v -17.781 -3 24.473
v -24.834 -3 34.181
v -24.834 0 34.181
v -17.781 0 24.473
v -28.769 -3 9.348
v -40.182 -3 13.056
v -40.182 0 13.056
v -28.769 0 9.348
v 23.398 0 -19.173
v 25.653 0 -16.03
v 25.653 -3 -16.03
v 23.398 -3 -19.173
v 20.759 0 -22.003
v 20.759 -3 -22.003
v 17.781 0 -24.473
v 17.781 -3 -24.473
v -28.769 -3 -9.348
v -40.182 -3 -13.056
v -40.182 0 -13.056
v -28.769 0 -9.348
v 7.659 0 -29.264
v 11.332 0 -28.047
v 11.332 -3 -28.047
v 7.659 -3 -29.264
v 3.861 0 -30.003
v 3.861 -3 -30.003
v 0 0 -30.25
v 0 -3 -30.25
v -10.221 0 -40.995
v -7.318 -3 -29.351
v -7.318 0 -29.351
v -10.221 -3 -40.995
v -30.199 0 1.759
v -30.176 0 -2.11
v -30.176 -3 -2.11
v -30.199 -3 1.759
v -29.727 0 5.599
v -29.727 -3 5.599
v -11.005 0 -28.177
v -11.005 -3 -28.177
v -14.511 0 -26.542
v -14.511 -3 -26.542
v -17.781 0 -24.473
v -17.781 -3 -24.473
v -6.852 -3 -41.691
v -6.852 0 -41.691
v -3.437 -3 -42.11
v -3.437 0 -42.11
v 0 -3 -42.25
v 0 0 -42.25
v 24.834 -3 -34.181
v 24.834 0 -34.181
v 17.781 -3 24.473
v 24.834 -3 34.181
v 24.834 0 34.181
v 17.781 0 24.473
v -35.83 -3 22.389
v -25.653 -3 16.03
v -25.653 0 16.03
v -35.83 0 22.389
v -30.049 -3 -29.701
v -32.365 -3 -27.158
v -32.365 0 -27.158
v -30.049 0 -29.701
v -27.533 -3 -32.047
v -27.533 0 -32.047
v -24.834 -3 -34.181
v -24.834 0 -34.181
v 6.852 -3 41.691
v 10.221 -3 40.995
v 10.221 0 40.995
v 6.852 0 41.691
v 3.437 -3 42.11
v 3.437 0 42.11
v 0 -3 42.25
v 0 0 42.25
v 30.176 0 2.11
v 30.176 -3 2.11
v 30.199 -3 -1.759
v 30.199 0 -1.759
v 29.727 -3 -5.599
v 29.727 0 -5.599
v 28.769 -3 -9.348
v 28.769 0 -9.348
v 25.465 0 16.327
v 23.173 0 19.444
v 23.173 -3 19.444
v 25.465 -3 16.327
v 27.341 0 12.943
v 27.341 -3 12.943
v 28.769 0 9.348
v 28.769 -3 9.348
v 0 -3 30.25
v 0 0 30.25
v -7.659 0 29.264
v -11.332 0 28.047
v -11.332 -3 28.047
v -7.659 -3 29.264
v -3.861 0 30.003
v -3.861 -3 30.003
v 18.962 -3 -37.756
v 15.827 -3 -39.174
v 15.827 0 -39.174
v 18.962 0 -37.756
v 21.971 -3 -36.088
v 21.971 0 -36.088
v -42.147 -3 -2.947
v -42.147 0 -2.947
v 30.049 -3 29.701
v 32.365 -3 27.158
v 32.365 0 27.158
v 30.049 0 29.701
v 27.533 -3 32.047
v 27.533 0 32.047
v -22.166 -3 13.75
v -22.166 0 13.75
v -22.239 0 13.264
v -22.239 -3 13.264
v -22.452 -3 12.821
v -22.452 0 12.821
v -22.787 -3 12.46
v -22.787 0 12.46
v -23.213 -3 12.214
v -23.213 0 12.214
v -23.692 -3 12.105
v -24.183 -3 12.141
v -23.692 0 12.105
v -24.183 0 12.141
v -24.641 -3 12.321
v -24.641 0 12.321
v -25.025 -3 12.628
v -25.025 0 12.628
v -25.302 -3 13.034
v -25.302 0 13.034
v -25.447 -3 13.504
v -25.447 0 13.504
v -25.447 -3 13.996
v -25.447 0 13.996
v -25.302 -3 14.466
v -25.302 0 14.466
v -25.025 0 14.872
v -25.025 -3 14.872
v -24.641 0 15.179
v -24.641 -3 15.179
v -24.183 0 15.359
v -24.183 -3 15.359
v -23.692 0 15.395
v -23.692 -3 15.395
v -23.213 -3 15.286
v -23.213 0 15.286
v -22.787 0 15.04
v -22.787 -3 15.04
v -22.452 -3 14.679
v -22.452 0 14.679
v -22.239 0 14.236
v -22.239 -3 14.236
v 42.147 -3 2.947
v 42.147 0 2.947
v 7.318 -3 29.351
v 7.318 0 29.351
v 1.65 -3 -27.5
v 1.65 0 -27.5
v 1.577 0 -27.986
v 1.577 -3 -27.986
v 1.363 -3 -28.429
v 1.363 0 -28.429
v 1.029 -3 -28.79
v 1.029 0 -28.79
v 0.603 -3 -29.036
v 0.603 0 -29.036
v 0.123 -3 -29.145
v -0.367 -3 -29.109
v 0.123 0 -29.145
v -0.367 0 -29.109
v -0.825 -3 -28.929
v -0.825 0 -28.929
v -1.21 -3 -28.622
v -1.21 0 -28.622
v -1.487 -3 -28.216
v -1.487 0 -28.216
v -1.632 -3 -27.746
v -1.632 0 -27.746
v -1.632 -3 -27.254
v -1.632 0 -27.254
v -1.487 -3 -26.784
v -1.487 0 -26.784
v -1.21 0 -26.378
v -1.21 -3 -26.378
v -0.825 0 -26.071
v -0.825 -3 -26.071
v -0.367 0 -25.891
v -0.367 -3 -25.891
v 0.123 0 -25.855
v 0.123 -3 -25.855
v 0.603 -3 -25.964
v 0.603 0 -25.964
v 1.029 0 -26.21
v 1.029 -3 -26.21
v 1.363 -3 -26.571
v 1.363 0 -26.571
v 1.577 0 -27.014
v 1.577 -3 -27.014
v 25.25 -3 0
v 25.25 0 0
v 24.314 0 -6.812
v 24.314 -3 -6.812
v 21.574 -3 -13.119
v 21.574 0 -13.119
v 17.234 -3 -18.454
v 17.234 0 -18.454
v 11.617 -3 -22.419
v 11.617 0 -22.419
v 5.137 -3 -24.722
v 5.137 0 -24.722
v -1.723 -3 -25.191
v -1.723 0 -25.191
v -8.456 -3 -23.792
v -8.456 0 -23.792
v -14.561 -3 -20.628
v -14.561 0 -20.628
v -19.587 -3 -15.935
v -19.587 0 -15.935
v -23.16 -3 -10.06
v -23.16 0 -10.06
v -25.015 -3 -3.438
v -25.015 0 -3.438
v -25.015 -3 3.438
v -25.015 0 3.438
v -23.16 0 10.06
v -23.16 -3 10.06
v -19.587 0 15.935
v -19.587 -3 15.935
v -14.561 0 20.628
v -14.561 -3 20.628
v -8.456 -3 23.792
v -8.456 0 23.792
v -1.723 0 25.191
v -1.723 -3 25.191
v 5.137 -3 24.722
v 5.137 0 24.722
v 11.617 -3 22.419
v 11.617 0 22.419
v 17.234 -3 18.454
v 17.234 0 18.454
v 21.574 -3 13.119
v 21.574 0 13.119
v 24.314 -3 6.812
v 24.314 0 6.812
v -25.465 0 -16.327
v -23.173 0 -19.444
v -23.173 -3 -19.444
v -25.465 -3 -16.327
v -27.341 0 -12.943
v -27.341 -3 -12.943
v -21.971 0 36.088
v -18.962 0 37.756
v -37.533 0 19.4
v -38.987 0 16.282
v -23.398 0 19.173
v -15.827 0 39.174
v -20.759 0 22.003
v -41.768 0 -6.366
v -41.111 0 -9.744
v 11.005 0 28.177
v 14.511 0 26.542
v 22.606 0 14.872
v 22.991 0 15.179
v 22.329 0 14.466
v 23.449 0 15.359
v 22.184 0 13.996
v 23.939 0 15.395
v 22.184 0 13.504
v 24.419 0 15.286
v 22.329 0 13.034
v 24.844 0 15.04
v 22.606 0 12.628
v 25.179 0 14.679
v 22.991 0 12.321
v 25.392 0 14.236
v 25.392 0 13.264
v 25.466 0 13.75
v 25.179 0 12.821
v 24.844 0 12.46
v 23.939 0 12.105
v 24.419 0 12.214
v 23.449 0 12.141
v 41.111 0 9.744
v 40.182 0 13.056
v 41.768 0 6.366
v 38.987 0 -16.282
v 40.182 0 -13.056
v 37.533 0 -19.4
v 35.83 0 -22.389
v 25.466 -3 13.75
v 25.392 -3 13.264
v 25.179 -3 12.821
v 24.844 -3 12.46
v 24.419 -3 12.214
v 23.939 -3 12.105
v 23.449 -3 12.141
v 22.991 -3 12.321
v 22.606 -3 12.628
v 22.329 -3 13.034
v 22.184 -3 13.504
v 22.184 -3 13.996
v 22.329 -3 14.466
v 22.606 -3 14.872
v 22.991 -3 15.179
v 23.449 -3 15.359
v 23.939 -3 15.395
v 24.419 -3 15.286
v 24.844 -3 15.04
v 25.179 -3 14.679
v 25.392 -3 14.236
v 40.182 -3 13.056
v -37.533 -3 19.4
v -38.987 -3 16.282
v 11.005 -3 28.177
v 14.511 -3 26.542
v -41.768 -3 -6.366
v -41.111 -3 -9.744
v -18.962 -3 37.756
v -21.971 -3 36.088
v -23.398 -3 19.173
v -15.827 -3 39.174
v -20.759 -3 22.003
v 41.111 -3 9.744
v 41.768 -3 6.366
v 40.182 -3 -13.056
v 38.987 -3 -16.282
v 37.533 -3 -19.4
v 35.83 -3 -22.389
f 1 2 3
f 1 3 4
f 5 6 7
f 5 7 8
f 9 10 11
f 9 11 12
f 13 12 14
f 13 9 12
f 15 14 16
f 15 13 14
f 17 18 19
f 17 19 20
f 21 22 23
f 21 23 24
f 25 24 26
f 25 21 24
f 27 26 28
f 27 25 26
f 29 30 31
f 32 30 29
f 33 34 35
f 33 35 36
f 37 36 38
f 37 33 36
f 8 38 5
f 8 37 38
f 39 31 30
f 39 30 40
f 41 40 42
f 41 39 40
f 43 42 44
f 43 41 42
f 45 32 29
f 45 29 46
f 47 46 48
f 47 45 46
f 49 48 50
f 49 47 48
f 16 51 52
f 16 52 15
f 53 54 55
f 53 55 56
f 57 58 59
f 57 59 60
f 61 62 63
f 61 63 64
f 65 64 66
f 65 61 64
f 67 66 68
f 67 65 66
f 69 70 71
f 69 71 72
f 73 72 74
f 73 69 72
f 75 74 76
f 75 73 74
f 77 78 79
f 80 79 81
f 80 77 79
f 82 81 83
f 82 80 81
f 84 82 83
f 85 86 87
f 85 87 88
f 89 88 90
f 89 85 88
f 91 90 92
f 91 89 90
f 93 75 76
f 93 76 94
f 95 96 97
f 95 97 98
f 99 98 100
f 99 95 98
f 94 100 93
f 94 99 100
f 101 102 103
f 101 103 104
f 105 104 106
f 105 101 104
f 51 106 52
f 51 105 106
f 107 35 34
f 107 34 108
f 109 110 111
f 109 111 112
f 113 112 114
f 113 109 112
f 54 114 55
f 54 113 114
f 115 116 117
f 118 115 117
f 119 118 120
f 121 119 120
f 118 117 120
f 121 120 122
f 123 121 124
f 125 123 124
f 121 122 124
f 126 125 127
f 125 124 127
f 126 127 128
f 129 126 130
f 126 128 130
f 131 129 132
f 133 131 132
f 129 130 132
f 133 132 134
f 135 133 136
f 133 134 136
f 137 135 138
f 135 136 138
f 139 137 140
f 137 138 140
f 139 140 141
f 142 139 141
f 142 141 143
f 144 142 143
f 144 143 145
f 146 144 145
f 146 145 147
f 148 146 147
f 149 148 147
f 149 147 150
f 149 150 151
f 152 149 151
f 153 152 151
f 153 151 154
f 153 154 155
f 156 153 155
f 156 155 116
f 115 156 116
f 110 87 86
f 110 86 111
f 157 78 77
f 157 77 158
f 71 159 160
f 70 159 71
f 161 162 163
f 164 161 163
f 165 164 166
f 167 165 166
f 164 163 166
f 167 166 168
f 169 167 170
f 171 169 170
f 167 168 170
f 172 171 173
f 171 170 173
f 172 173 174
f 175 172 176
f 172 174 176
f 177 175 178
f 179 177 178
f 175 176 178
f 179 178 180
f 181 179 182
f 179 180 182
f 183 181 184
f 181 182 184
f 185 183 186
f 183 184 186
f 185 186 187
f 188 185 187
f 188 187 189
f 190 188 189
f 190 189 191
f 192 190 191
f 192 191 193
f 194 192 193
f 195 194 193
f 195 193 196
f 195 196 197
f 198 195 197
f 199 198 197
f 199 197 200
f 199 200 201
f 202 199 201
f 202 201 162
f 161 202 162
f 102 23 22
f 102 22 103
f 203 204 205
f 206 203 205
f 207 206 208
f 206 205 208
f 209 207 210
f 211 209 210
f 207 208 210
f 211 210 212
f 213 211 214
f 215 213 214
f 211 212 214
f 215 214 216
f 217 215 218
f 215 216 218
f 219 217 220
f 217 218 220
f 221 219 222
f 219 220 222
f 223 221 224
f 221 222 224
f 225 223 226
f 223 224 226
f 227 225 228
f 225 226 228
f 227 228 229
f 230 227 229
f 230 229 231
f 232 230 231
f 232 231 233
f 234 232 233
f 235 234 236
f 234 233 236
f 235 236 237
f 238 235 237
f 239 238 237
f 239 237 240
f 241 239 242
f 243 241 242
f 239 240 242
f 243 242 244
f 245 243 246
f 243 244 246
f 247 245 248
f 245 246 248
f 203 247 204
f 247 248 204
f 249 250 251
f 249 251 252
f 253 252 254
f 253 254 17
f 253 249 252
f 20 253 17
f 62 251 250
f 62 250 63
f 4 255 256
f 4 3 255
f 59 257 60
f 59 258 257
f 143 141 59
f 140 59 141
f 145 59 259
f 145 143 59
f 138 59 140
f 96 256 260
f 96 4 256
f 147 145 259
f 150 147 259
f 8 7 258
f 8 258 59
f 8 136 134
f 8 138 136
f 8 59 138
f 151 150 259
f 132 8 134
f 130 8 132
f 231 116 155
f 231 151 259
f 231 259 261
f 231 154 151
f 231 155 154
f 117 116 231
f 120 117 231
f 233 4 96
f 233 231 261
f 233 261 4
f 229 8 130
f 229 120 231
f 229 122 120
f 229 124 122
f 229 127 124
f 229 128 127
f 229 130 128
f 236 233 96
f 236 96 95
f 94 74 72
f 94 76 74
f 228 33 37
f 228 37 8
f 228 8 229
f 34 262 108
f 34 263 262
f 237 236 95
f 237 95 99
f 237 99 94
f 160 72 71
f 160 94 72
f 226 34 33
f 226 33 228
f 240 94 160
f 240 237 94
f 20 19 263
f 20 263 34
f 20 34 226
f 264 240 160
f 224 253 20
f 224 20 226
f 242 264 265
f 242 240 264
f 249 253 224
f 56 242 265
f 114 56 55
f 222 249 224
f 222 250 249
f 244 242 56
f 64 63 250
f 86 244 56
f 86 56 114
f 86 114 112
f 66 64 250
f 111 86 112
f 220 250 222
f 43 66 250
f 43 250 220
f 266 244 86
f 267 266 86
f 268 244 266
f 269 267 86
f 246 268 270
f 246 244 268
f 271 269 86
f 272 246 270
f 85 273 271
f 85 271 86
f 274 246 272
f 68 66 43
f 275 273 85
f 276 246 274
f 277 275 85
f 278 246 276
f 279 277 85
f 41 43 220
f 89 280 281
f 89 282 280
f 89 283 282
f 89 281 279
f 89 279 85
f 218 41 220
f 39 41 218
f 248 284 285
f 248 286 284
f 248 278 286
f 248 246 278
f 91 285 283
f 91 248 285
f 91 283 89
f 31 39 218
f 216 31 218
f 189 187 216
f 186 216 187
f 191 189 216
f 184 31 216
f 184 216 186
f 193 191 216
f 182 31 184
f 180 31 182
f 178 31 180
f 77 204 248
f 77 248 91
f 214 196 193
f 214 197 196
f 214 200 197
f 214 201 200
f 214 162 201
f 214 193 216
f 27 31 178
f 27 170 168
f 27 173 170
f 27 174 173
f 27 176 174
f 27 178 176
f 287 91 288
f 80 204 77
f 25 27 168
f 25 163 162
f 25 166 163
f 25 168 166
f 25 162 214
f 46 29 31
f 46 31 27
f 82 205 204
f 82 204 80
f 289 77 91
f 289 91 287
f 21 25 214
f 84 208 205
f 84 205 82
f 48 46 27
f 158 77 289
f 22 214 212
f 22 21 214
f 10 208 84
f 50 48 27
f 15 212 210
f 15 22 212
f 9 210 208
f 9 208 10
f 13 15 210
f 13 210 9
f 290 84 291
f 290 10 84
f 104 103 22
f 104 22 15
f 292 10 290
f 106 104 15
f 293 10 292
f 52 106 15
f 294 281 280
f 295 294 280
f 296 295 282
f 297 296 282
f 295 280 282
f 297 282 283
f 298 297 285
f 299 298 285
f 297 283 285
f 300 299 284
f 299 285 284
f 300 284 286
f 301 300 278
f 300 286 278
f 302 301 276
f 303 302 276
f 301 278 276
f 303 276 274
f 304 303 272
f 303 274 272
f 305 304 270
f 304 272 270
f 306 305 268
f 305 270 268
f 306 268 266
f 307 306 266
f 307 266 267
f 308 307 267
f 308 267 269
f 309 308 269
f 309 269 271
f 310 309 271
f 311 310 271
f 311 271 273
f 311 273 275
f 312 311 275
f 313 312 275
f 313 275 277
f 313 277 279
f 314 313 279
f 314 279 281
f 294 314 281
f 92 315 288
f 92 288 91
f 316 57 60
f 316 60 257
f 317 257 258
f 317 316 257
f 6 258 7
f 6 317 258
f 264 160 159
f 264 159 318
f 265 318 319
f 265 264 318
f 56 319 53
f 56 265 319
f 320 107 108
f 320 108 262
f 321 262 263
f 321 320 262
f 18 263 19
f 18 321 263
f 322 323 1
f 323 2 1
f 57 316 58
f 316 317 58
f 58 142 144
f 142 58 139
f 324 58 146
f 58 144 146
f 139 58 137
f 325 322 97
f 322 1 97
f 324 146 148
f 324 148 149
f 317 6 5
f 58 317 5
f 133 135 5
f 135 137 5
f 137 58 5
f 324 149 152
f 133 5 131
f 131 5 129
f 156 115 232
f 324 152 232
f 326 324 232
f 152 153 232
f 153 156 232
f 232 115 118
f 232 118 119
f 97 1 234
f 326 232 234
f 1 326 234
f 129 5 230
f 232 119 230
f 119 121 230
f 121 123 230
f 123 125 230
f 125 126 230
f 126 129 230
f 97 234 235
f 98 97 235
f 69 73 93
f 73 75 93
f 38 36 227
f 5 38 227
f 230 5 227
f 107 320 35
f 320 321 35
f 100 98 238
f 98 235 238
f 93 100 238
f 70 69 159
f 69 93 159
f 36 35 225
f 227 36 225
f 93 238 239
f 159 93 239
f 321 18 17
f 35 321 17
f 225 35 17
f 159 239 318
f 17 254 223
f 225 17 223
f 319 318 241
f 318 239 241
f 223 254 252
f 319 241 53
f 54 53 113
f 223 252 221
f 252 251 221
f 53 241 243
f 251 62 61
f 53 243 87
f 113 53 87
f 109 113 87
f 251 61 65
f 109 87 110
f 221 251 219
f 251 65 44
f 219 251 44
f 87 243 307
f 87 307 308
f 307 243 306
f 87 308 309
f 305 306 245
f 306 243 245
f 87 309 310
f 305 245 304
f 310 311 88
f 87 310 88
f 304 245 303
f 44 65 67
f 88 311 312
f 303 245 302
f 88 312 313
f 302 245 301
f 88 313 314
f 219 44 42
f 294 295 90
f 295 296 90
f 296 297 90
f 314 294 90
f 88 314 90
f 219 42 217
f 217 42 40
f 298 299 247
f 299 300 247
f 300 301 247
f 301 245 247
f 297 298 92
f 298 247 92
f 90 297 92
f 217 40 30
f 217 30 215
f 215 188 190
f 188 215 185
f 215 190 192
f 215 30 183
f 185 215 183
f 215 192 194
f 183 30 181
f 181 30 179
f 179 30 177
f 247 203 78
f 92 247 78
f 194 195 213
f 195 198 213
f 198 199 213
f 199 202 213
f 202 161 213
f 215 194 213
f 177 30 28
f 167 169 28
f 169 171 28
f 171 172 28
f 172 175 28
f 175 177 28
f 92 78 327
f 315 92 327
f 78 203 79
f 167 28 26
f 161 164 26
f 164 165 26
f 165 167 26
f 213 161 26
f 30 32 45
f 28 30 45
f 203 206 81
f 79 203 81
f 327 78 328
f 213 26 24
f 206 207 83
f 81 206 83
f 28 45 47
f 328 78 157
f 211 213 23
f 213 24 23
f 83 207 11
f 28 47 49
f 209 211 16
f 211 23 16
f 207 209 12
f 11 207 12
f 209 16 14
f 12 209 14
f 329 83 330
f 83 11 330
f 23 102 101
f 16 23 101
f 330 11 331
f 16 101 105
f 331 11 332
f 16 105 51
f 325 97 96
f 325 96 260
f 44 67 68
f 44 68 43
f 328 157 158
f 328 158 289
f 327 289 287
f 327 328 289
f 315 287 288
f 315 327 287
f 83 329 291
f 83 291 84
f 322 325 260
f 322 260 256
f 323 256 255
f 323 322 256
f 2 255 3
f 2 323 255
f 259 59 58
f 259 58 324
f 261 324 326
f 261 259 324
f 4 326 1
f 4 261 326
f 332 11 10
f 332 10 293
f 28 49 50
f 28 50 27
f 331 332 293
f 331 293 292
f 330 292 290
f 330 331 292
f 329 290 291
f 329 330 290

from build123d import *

# Parameters (mm, degrees)
SKETCH1_R           = 30.25
SKETCH1_R_2         = 25.25
EXTRUDE_THIN1_DEPTH = 3
SKETCH2_R           = 1.65
CUT_EXTRUDE3_DEPTH  = 10
BOSS_EXTRUDE1_DEPTH = 3


with BuildPart() as part:
    # Sketch1 → Extrude-Thin1 (new body)
    with BuildSketch(Plane(origin=(0, 0, 0), x_dir=(1, 0, 0), z_dir=(0, 1, 0))):
        Circle(SKETCH1_R)
        Circle(SKETCH1_R_2, mode=Mode.SUBTRACT)
    extrude(amount=-EXTRUDE_THIN1_DEPTH)

    # Sketch2 → Cut-Extrude3 (cut)
    with BuildSketch(Plane(origin=(0, 0, 0), x_dir=(1, 0, 0), z_dir=(0, 1, 0))):
        with Locations((0, 27.5)):
            Circle(SKETCH2_R)
        with Locations((23.815698604, -13.75)):
            Circle(SKETCH2_R)
        with Locations((-23.815698604, -13.75)):
            Circle(SKETCH2_R)
    extrude(amount=-CUT_EXTRUDE3_DEPTH, mode=Mode.SUBTRACT)

    # Sketch5 → Boss-Extrude1 (add)
    with BuildSketch(Plane.XZ.offset(3)):
        with BuildLine():
            Line((0, 42.25), (0, 30.25))
            ThreePointArc((0, 30.25), (3.686547638, 30.024521087), (7.318137342, 29.35144572))
            Line((7.318137342, 29.35144572), (10.221200089, 40.994994435))
            ThreePointArc((10.221200089, 40.994994435), (5.148979759, 41.935074907), (0, 42.25))
        make_face()
        with BuildLine():
            Line((24.833926909, 34.180968012), (17.780503882, 24.47276408))
            ThreePointArc((17.780503882, 24.47276408), (20.630450392, 22.123449474), (23.172844404, 19.444325193))
            Line((23.172844404, 19.444325193), (32.365377722, 27.157776509))
            ThreePointArc((32.365377722, 27.157776509), (28.814430713, 30.899693893), (24.833926909, 34.180968012))
        make_face()
        with BuildLine():
            Line((40.182137813, 13.055968012), (28.769459618, 9.34776408))
            ThreePointArc((28.769459618, 9.34776408), (29.694222299, 5.77197211), (30.17631252, 2.110133331))
            Line((30.17631252, 2.110133331), (42.147081123, 2.947211016))
            ThreePointArc((42.147081123, 2.947211016), (41.473748501, 8.061680055), (40.182137813, 13.055968012))
        make_face()
        with BuildLine():
            Line((40.182137813, -13.055968012), (28.769459618, -9.34776408))
            ThreePointArc((28.769459618, -9.34776408), (27.415810558, -12.784202418), (25.653454909, -16.030057743))
            Line((25.653454909, -16.030057743), (35.830032063, -22.389088914))
            ThreePointArc((35.830032063, -22.389088914), (38.291504002, -17.855621559), (40.182137813, -13.055968012))
        make_face()
        with BuildLine():
            Line((24.833926909, -34.180968012), (17.780503882, -24.47276408))
            ThreePointArc((17.780503882, -24.47276408), (14.665491012, -26.457246141), (11.331849451, -28.047311601))
            Line((11.331849451, -28.047311601), (15.827128572, -39.173517855))
            ThreePointArc((15.827128572, -39.173517855), (20.483206455, -36.952682627), (24.833926909, -34.180968012))
        make_face()
        with BuildLine():
            Line((0, -42.25), (0, -30.25))
            ThreePointArc((0, -30.25), (-3.686547638, -30.024521087), (-7.318137342, -29.35144572))
            Line((-7.318137342, -29.35144572), (-10.221200089, -40.994994435))
            ThreePointArc((-10.221200089, -40.994994435), (-5.148979759, -41.935074907), (0, -42.25))
        make_face()
        with BuildLine():
            Line((-24.833926909, -34.180968012), (-17.780503882, -24.47276408))
            ThreePointArc((-17.780503882, -24.47276408), (-20.630450392, -22.123449474), (-23.172844404, -19.444325193))
            Line((-23.172844404, -19.444325193), (-32.365377722, -27.157776509))
            ThreePointArc((-32.365377722, -27.157776509), (-28.814430713, -30.899693893), (-24.833926909, -34.180968012))
        make_face()
        with BuildLine():
            Line((-40.182137813, -13.055968012), (-28.769459618, -9.34776408))
            ThreePointArc((-28.769459618, -9.34776408), (-29.694222299, -5.77197211), (-30.17631252, -2.110133331))
            Line((-30.17631252, -2.110133331), (-42.147081123, -2.947211016))
            ThreePointArc((-42.147081123, -2.947211016), (-41.473748501, -8.061680055), (-40.182137813, -13.055968012))
        make_face()
        with BuildLine():
            Line((-40.182137813, 13.055968012), (-28.769459618, 9.34776408))
            ThreePointArc((-28.769459618, 9.34776408), (-27.415810558, 12.784202418), (-25.653454909, 16.030057743))
            Line((-25.653454909, 16.030057743), (-35.830032063, 22.389088914))
            ThreePointArc((-35.830032063, 22.389088914), (-38.291504002, 17.855621559), (-40.182137813, 13.055968012))
        make_face()
        with BuildLine():
            Line((-24.833926909, 34.180968012), (-17.780503882, 24.47276408))
            ThreePointArc((-17.780503882, 24.47276408), (-14.665491012, 26.457246141), (-11.331849451, 28.047311601))
            Line((-11.331849451, 28.047311601), (-15.827128572, 39.173517855))
            ThreePointArc((-15.827128572, 39.173517855), (-20.483206455, 36.952682627), (-24.833926909, 34.180968012))
        make_face()
    extrude(amount=-BOSS_EXTRUDE1_DEPTH)


solid = part.part
